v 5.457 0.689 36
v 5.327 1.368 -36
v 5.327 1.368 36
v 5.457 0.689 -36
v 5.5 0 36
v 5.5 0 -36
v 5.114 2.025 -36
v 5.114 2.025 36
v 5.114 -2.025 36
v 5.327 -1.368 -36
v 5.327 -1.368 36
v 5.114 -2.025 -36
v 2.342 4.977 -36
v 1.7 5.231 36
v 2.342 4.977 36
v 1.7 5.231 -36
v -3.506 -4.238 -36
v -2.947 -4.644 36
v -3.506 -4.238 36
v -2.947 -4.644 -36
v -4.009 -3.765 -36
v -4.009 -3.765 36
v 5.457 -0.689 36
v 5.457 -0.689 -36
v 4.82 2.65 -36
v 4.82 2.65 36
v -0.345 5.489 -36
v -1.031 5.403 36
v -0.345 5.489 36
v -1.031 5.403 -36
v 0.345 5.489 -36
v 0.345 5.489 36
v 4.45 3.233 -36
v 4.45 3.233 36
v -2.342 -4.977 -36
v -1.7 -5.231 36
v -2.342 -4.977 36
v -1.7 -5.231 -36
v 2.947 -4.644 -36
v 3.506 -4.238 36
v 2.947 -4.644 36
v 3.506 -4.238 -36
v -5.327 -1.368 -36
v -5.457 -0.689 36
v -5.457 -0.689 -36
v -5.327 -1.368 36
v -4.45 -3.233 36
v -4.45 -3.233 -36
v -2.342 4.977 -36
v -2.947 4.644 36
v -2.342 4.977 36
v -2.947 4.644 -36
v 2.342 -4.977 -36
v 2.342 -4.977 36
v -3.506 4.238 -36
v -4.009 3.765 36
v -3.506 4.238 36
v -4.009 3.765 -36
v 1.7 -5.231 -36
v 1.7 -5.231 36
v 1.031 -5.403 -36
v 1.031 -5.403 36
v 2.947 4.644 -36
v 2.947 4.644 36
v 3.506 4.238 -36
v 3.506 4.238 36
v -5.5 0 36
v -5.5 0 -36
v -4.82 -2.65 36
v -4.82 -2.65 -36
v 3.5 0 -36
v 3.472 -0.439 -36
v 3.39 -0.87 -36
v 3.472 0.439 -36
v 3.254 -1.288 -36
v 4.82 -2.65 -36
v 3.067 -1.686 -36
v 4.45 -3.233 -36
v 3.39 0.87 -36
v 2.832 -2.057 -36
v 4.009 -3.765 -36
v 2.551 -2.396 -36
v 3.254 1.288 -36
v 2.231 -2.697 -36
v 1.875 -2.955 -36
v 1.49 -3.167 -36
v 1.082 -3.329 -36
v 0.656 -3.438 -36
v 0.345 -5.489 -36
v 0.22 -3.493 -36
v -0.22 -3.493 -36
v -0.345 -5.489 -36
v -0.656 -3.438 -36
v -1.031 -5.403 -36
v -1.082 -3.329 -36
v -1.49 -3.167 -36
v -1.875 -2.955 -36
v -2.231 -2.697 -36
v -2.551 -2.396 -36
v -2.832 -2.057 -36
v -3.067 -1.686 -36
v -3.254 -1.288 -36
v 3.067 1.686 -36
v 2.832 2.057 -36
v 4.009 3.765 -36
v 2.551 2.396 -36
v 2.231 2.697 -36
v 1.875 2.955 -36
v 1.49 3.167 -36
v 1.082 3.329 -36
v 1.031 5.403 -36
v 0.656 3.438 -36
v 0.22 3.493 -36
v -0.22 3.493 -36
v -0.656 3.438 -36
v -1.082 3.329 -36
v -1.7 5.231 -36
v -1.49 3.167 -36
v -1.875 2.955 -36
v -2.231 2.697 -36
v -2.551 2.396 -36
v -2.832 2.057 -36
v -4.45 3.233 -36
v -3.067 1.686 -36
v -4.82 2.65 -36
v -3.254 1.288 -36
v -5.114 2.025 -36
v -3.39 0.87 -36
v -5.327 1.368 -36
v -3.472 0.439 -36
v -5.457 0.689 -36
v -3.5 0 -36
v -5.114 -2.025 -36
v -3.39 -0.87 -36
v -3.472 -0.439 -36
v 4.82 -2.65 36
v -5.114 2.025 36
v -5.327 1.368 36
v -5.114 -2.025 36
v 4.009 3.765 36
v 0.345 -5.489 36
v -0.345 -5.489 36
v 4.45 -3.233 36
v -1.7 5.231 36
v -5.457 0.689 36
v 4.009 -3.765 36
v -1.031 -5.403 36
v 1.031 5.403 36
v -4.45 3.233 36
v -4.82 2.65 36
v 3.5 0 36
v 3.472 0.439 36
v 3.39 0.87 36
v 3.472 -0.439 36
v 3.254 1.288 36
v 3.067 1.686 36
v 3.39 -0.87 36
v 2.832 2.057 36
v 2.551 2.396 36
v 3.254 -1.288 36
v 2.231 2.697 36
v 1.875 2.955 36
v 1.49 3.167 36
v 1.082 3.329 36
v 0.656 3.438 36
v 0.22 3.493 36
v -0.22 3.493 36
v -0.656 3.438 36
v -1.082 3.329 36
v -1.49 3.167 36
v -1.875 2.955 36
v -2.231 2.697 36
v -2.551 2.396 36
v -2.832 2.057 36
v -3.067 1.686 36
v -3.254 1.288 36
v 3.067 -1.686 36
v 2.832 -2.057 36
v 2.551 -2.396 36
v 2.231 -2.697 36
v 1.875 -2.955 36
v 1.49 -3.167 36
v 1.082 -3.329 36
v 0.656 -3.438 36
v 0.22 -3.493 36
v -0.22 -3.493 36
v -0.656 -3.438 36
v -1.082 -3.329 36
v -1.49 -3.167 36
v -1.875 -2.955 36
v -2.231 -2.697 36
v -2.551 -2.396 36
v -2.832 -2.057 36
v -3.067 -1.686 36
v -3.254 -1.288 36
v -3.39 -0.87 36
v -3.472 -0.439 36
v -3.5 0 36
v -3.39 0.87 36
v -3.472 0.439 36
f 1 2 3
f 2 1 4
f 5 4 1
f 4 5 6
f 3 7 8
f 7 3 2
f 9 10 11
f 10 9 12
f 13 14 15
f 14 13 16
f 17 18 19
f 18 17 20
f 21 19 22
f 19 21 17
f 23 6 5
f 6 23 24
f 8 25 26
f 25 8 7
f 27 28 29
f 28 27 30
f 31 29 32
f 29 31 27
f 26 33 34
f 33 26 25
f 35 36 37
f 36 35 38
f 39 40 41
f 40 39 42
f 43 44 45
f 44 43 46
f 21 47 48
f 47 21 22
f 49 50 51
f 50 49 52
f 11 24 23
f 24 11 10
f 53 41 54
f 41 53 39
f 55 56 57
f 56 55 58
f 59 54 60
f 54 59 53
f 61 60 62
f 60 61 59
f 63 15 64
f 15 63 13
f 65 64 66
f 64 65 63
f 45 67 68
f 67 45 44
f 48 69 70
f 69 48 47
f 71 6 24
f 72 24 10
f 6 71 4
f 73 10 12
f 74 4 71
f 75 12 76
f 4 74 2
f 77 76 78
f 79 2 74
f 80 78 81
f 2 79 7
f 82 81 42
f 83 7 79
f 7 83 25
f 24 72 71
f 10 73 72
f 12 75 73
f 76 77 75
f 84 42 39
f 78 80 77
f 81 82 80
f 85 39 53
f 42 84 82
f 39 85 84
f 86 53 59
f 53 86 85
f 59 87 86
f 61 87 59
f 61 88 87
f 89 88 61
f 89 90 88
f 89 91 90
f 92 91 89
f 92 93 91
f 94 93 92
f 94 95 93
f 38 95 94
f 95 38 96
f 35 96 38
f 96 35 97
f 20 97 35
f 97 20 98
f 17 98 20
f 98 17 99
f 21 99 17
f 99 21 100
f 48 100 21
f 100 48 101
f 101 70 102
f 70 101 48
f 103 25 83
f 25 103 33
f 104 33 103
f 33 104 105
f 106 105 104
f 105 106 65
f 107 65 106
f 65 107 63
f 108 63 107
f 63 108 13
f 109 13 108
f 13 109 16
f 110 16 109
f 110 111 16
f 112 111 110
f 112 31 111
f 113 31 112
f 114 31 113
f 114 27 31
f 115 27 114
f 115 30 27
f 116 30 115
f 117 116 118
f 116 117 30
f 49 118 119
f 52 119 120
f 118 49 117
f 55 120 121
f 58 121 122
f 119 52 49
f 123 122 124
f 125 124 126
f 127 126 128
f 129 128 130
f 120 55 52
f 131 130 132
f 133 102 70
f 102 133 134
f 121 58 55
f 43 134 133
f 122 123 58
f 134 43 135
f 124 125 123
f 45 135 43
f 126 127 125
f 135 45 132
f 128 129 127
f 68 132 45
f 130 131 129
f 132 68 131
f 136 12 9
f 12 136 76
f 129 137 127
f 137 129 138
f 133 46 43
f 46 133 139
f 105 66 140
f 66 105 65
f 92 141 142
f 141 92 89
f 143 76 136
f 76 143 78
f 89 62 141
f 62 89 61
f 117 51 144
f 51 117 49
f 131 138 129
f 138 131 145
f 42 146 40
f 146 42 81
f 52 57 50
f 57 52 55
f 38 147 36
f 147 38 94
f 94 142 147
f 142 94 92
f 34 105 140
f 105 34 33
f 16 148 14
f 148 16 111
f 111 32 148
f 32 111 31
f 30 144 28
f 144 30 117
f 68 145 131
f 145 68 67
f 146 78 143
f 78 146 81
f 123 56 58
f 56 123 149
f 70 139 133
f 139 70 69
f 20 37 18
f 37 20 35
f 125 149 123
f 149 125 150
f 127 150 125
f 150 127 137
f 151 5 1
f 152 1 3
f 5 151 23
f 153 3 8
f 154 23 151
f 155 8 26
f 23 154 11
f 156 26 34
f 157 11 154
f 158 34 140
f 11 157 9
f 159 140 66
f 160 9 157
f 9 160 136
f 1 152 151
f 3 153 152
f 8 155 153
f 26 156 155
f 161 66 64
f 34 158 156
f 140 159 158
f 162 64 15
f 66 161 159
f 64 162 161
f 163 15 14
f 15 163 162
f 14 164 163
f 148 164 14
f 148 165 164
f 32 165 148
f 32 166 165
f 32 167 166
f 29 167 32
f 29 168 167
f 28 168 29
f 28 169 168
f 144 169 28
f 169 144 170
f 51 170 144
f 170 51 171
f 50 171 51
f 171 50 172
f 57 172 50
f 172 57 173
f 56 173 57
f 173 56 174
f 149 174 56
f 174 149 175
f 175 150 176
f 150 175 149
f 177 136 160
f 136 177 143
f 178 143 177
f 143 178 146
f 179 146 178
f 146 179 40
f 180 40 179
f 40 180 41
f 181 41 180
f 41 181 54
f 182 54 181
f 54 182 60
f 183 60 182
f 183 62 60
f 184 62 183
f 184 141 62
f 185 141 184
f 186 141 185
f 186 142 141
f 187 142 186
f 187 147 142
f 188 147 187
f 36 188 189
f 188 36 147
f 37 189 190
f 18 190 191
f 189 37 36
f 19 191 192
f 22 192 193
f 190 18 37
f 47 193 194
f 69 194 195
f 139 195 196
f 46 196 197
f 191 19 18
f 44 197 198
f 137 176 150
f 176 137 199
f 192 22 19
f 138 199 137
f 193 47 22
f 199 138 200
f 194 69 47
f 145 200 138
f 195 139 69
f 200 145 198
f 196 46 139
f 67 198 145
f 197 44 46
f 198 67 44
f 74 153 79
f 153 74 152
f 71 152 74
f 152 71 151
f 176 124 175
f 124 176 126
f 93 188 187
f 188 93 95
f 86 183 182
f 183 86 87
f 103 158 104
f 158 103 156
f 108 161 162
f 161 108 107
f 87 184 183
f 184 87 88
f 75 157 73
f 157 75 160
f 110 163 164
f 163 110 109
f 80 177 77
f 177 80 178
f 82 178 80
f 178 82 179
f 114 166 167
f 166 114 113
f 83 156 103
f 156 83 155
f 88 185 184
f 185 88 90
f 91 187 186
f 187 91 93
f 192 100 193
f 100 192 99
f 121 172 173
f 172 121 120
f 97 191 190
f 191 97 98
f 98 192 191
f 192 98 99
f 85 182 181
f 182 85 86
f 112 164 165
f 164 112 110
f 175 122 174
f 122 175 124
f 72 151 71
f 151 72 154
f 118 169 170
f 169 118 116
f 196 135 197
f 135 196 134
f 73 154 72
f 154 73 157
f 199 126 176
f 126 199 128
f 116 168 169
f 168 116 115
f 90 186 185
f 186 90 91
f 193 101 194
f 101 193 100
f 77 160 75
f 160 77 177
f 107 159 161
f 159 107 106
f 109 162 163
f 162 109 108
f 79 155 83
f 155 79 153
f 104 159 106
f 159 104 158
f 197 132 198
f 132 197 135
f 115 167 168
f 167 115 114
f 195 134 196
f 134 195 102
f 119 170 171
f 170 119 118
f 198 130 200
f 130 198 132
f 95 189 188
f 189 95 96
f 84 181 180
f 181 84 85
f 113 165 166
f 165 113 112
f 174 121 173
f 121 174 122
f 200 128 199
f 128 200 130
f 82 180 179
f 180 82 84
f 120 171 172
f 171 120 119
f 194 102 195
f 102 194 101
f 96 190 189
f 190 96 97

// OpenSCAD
$fn = 50;


difference() {
	union() {
		translate(v = [0, 0, -36.0000000000]) {
			cylinder(h = 72, r = 5.5000000000);
		}
	}
	union() {
		translate(v = [0, 0, -100.0000000000]) {
			cylinder(h = 200, r = 3.5000000000);
		}
	}
}
